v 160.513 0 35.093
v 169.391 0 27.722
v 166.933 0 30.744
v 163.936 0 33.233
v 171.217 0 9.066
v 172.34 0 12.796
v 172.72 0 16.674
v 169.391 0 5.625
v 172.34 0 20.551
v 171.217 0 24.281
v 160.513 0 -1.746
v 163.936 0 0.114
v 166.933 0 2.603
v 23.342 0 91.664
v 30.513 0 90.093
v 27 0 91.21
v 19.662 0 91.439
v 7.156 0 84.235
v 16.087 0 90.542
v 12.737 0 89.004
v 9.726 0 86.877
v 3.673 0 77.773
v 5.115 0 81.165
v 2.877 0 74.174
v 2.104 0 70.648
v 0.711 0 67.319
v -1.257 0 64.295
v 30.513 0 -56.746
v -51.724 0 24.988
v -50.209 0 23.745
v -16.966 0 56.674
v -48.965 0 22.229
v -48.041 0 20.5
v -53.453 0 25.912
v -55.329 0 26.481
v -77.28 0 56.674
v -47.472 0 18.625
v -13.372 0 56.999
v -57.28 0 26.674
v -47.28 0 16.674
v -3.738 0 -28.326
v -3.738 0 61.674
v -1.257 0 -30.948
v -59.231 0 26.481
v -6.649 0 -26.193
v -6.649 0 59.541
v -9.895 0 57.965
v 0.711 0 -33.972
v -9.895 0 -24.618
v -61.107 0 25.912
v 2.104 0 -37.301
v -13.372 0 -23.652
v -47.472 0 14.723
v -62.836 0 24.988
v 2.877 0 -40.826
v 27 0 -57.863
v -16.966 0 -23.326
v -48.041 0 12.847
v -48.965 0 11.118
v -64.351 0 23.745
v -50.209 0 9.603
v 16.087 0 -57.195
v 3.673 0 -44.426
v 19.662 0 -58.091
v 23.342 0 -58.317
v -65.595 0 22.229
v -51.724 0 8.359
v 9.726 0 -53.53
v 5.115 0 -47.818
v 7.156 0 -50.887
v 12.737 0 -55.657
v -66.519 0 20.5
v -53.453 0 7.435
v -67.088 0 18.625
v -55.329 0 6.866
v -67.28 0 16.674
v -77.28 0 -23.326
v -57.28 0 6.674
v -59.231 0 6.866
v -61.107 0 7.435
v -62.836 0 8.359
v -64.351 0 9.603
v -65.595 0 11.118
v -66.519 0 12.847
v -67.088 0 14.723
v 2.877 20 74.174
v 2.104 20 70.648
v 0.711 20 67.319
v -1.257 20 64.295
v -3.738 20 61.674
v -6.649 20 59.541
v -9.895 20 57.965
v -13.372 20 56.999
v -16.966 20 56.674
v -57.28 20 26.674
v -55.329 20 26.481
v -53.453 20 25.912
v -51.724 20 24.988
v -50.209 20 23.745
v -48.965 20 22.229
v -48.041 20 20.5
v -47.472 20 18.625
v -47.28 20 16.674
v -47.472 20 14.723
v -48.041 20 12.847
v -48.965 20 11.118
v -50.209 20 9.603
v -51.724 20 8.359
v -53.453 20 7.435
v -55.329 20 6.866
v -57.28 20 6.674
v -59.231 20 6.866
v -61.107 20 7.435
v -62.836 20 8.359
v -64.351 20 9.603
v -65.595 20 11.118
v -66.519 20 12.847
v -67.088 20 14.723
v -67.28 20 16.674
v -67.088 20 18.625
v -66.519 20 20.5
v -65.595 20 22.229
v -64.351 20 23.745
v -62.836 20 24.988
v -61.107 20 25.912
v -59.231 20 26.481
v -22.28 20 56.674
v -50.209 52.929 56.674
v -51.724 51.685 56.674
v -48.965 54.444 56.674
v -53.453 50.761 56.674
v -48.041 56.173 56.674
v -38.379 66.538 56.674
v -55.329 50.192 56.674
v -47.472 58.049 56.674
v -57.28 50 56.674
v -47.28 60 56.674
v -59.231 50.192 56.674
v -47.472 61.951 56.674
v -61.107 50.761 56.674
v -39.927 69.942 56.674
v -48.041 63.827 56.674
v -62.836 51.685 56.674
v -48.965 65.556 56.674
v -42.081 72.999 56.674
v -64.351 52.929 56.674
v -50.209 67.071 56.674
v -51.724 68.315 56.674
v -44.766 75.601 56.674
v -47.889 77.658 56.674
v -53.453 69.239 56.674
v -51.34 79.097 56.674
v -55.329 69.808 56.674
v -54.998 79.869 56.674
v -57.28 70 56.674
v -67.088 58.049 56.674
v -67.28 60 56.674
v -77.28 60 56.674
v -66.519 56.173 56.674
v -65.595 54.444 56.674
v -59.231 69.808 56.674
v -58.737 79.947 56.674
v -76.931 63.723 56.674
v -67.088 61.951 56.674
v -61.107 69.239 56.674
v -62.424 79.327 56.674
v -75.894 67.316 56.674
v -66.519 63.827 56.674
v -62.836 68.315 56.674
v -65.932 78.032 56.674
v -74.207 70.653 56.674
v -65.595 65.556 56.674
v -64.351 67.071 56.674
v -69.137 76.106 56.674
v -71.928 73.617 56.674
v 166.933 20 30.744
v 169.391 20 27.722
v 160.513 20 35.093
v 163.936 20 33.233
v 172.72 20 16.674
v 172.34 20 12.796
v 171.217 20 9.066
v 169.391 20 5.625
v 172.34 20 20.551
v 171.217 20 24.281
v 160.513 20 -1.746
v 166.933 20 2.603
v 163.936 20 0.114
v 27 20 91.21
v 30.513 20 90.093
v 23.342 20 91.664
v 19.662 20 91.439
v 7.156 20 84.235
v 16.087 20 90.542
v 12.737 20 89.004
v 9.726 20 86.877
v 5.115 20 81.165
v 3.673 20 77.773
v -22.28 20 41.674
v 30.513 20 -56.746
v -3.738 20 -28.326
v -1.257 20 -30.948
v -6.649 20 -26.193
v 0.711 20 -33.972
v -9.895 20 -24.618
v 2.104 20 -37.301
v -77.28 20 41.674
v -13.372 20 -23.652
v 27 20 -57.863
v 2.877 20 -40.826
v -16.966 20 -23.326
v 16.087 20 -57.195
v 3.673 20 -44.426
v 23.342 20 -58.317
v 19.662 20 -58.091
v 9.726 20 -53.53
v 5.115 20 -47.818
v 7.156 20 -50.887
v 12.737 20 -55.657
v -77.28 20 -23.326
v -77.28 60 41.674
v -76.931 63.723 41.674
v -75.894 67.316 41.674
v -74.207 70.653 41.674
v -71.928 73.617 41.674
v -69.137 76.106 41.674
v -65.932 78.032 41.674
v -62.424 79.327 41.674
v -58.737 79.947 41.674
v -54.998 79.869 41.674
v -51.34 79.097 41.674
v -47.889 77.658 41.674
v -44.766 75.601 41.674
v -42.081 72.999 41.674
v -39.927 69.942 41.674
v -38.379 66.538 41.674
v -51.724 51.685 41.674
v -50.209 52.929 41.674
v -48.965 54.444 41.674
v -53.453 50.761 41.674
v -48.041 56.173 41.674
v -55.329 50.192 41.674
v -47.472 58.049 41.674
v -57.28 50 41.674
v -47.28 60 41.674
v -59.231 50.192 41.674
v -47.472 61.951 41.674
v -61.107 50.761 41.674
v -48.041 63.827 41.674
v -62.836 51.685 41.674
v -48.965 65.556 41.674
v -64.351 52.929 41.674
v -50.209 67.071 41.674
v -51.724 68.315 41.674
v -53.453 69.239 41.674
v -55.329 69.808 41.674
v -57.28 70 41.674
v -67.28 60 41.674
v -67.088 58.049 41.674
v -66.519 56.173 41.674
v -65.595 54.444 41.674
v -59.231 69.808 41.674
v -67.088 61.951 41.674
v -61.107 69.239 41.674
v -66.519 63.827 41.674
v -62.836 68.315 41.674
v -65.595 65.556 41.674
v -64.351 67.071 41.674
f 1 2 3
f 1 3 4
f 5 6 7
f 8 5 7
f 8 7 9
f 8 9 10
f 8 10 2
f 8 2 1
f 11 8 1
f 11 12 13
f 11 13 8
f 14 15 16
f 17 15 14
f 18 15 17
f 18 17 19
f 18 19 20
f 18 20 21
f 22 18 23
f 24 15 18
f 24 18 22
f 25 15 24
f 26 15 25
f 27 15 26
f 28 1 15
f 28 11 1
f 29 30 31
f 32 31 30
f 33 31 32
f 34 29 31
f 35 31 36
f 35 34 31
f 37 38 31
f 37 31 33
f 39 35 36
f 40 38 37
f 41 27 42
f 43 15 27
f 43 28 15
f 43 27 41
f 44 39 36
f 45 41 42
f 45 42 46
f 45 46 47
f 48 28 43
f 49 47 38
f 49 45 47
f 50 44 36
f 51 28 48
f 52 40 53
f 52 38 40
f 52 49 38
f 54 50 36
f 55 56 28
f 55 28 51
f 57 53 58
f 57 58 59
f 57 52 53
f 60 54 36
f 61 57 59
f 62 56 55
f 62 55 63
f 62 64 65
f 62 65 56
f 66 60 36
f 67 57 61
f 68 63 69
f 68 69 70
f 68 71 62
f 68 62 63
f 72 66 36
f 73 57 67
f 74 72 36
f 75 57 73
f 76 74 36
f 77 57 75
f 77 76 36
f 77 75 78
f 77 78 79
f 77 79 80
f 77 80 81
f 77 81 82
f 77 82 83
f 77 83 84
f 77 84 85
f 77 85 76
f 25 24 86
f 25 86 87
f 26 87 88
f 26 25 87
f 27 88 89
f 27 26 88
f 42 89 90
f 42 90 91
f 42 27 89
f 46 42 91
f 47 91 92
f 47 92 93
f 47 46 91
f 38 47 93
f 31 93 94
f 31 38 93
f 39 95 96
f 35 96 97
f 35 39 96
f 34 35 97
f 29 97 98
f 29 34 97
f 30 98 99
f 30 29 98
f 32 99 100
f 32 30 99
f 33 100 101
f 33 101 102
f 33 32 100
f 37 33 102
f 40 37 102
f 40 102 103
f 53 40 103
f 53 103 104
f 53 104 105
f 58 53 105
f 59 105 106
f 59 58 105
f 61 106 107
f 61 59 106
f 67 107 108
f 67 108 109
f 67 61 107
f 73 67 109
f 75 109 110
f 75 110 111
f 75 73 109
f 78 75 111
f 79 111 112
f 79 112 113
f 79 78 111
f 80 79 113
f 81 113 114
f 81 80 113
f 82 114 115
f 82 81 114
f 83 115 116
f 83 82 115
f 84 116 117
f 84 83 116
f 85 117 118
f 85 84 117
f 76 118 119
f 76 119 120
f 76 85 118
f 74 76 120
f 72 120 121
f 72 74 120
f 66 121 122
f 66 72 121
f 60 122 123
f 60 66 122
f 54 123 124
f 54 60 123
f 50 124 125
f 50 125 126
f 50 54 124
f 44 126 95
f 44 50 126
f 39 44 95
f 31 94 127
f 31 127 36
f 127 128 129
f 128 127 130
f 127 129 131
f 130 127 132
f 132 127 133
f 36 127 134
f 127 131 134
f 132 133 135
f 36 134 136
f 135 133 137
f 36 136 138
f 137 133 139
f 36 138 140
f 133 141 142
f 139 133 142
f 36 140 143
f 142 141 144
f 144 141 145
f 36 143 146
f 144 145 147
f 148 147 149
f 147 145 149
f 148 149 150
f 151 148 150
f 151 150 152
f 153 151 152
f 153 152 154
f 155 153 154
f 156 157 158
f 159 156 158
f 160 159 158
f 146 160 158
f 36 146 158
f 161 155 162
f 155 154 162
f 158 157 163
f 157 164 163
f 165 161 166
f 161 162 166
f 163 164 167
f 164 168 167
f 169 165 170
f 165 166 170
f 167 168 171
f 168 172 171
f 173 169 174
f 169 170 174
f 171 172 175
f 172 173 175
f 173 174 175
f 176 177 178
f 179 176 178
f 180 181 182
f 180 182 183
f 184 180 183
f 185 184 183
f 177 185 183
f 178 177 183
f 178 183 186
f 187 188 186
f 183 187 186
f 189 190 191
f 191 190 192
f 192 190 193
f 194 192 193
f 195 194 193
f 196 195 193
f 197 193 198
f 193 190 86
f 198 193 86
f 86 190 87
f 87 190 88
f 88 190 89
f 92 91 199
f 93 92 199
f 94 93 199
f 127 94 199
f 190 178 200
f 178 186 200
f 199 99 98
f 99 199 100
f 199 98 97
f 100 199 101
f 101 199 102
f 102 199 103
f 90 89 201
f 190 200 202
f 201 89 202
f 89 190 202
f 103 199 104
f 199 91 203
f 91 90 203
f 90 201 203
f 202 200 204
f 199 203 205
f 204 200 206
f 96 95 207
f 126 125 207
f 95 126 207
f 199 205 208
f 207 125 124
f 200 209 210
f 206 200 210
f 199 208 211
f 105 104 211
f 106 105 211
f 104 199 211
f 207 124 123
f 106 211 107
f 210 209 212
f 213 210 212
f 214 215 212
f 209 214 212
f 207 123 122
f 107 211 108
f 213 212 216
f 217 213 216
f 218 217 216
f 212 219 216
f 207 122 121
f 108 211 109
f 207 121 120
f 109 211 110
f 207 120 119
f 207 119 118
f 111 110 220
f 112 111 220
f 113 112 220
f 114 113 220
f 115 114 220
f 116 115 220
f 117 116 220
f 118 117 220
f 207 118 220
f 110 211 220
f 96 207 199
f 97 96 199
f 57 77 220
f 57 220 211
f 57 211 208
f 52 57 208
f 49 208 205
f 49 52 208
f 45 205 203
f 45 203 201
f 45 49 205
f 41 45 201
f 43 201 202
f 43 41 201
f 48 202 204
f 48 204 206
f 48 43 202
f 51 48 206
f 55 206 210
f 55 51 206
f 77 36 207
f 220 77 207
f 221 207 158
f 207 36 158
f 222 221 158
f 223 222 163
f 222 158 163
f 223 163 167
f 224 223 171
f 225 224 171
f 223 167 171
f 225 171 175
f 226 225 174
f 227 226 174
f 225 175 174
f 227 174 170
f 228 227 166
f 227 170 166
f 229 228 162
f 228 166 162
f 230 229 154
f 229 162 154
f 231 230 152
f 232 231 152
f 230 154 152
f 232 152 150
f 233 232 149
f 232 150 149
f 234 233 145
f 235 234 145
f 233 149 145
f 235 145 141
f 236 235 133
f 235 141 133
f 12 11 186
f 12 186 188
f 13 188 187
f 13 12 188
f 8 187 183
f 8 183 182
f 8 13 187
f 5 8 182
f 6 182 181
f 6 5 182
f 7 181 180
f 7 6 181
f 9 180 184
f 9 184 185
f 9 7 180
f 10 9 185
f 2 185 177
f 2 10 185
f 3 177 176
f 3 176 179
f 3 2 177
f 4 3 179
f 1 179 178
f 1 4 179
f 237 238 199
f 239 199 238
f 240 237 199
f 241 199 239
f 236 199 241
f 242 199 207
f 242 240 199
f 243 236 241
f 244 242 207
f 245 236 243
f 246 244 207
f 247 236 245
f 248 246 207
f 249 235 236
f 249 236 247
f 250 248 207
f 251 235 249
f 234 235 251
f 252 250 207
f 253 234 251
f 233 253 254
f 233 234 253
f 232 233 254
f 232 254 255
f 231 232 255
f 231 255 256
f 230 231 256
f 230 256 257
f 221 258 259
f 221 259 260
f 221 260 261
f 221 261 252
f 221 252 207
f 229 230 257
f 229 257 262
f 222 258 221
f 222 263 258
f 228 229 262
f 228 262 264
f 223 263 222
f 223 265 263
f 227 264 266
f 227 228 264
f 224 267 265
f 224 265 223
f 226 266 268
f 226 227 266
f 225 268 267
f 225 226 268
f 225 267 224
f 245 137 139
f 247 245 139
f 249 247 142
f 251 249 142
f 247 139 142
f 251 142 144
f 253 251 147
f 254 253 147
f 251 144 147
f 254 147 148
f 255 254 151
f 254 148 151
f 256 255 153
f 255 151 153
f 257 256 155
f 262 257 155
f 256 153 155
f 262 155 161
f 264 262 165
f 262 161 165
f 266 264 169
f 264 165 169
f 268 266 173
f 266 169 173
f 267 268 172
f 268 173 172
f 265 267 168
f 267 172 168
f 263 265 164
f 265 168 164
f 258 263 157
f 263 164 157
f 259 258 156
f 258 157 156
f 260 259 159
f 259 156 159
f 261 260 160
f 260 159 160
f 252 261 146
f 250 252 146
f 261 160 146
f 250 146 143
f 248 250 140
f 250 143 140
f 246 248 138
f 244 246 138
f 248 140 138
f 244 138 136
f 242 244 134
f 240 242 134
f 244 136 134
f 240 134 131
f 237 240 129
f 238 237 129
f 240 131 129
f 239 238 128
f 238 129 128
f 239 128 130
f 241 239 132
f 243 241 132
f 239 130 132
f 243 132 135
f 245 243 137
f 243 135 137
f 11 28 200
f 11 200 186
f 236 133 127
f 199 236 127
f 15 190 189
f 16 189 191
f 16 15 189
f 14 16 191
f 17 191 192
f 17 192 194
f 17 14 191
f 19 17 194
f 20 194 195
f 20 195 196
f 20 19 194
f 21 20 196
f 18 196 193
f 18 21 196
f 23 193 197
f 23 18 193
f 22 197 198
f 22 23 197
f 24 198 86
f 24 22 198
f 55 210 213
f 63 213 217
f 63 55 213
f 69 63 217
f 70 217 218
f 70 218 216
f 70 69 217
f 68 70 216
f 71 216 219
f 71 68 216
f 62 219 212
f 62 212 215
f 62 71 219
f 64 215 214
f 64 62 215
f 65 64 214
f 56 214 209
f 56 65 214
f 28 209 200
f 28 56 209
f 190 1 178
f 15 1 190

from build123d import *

# Parameters (mm, degrees)
SKETCH4_R           = 10
BOSS_EXTRUDE1_DEPTH = 20
SKETCH5_R           = 10
BOSS_EXTRUDE2_DEPTH = 15


with BuildPart() as part:
    # Sketch4 → Boss-Extrude1 (new body)
    with BuildSketch(Plane(origin=(0, 0, 0), x_dir=(1, 0, 0), z_dir=(0, 1, 0))):
        with BuildLine():
            Line((-77.28011811, -56.673598022), (-77.28011811, 23.326401978))
            Line((-77.28011811, 23.326401978), (-16.966387776, 23.326401978))
            ThreePointArc((-16.966387776, 23.326401978), (-3.737631221, 28.326401978), (2.876747057, 40.826401978))
            ThreePointArc((2.876747057, 40.826401978), (12.736944948, 55.656750215), (30.512681706, 56.745747))
            Line((30.512681706, 56.745747), (160.512681706, 1.745747))
            ThreePointArc((160.512681706, 1.745747), (172.71988189, -16.673598022), (160.512681706, -35.092943043))
            Line((160.512681706, -35.092943043), (30.512681706, -90.092943043))
            ThreePointArc((30.512681706, -90.092943043), (12.736944948, -89.003946259), (2.876747057, -74.173598022))
            ThreePointArc((2.876747057, -74.173598022), (-3.737631221, -61.673598022), (-16.966387776, -56.673598022))
            Line((-16.966387776, -56.673598022), (-77.28011811, -56.673598022))
        make_face()
        with Locations(Location((-57.28011811, -16.673598022, 0), (0, 0, 270))):
            Circle(SKETCH4_R, mode=Mode.SUBTRACT)
    extrude(amount=BOSS_EXTRUDE1_DEPTH)

    # Sketch5 → Boss-Extrude2 (add)
    with BuildSketch(Plane.XY.offset(56.673598022)):
        with BuildLine():
            Line((-77.28011811, 20), (-77.28011811, 60))
            ThreePointArc((-77.28011811, 60), (-60.595178298, 79.723345962), (-38.379080515, 66.538407896))
            Line((-38.379080515, 66.538407896), (-22.28011811, 20))
            Line((-22.28011811, 20), (-77.28011811, 20))
        make_face()
        with Locations((-57.28011811, 60)):
            Circle(SKETCH5_R, mode=Mode.SUBTRACT)
    extrude(amount=-BOSS_EXTRUDE2_DEPTH)


solid = part.part
